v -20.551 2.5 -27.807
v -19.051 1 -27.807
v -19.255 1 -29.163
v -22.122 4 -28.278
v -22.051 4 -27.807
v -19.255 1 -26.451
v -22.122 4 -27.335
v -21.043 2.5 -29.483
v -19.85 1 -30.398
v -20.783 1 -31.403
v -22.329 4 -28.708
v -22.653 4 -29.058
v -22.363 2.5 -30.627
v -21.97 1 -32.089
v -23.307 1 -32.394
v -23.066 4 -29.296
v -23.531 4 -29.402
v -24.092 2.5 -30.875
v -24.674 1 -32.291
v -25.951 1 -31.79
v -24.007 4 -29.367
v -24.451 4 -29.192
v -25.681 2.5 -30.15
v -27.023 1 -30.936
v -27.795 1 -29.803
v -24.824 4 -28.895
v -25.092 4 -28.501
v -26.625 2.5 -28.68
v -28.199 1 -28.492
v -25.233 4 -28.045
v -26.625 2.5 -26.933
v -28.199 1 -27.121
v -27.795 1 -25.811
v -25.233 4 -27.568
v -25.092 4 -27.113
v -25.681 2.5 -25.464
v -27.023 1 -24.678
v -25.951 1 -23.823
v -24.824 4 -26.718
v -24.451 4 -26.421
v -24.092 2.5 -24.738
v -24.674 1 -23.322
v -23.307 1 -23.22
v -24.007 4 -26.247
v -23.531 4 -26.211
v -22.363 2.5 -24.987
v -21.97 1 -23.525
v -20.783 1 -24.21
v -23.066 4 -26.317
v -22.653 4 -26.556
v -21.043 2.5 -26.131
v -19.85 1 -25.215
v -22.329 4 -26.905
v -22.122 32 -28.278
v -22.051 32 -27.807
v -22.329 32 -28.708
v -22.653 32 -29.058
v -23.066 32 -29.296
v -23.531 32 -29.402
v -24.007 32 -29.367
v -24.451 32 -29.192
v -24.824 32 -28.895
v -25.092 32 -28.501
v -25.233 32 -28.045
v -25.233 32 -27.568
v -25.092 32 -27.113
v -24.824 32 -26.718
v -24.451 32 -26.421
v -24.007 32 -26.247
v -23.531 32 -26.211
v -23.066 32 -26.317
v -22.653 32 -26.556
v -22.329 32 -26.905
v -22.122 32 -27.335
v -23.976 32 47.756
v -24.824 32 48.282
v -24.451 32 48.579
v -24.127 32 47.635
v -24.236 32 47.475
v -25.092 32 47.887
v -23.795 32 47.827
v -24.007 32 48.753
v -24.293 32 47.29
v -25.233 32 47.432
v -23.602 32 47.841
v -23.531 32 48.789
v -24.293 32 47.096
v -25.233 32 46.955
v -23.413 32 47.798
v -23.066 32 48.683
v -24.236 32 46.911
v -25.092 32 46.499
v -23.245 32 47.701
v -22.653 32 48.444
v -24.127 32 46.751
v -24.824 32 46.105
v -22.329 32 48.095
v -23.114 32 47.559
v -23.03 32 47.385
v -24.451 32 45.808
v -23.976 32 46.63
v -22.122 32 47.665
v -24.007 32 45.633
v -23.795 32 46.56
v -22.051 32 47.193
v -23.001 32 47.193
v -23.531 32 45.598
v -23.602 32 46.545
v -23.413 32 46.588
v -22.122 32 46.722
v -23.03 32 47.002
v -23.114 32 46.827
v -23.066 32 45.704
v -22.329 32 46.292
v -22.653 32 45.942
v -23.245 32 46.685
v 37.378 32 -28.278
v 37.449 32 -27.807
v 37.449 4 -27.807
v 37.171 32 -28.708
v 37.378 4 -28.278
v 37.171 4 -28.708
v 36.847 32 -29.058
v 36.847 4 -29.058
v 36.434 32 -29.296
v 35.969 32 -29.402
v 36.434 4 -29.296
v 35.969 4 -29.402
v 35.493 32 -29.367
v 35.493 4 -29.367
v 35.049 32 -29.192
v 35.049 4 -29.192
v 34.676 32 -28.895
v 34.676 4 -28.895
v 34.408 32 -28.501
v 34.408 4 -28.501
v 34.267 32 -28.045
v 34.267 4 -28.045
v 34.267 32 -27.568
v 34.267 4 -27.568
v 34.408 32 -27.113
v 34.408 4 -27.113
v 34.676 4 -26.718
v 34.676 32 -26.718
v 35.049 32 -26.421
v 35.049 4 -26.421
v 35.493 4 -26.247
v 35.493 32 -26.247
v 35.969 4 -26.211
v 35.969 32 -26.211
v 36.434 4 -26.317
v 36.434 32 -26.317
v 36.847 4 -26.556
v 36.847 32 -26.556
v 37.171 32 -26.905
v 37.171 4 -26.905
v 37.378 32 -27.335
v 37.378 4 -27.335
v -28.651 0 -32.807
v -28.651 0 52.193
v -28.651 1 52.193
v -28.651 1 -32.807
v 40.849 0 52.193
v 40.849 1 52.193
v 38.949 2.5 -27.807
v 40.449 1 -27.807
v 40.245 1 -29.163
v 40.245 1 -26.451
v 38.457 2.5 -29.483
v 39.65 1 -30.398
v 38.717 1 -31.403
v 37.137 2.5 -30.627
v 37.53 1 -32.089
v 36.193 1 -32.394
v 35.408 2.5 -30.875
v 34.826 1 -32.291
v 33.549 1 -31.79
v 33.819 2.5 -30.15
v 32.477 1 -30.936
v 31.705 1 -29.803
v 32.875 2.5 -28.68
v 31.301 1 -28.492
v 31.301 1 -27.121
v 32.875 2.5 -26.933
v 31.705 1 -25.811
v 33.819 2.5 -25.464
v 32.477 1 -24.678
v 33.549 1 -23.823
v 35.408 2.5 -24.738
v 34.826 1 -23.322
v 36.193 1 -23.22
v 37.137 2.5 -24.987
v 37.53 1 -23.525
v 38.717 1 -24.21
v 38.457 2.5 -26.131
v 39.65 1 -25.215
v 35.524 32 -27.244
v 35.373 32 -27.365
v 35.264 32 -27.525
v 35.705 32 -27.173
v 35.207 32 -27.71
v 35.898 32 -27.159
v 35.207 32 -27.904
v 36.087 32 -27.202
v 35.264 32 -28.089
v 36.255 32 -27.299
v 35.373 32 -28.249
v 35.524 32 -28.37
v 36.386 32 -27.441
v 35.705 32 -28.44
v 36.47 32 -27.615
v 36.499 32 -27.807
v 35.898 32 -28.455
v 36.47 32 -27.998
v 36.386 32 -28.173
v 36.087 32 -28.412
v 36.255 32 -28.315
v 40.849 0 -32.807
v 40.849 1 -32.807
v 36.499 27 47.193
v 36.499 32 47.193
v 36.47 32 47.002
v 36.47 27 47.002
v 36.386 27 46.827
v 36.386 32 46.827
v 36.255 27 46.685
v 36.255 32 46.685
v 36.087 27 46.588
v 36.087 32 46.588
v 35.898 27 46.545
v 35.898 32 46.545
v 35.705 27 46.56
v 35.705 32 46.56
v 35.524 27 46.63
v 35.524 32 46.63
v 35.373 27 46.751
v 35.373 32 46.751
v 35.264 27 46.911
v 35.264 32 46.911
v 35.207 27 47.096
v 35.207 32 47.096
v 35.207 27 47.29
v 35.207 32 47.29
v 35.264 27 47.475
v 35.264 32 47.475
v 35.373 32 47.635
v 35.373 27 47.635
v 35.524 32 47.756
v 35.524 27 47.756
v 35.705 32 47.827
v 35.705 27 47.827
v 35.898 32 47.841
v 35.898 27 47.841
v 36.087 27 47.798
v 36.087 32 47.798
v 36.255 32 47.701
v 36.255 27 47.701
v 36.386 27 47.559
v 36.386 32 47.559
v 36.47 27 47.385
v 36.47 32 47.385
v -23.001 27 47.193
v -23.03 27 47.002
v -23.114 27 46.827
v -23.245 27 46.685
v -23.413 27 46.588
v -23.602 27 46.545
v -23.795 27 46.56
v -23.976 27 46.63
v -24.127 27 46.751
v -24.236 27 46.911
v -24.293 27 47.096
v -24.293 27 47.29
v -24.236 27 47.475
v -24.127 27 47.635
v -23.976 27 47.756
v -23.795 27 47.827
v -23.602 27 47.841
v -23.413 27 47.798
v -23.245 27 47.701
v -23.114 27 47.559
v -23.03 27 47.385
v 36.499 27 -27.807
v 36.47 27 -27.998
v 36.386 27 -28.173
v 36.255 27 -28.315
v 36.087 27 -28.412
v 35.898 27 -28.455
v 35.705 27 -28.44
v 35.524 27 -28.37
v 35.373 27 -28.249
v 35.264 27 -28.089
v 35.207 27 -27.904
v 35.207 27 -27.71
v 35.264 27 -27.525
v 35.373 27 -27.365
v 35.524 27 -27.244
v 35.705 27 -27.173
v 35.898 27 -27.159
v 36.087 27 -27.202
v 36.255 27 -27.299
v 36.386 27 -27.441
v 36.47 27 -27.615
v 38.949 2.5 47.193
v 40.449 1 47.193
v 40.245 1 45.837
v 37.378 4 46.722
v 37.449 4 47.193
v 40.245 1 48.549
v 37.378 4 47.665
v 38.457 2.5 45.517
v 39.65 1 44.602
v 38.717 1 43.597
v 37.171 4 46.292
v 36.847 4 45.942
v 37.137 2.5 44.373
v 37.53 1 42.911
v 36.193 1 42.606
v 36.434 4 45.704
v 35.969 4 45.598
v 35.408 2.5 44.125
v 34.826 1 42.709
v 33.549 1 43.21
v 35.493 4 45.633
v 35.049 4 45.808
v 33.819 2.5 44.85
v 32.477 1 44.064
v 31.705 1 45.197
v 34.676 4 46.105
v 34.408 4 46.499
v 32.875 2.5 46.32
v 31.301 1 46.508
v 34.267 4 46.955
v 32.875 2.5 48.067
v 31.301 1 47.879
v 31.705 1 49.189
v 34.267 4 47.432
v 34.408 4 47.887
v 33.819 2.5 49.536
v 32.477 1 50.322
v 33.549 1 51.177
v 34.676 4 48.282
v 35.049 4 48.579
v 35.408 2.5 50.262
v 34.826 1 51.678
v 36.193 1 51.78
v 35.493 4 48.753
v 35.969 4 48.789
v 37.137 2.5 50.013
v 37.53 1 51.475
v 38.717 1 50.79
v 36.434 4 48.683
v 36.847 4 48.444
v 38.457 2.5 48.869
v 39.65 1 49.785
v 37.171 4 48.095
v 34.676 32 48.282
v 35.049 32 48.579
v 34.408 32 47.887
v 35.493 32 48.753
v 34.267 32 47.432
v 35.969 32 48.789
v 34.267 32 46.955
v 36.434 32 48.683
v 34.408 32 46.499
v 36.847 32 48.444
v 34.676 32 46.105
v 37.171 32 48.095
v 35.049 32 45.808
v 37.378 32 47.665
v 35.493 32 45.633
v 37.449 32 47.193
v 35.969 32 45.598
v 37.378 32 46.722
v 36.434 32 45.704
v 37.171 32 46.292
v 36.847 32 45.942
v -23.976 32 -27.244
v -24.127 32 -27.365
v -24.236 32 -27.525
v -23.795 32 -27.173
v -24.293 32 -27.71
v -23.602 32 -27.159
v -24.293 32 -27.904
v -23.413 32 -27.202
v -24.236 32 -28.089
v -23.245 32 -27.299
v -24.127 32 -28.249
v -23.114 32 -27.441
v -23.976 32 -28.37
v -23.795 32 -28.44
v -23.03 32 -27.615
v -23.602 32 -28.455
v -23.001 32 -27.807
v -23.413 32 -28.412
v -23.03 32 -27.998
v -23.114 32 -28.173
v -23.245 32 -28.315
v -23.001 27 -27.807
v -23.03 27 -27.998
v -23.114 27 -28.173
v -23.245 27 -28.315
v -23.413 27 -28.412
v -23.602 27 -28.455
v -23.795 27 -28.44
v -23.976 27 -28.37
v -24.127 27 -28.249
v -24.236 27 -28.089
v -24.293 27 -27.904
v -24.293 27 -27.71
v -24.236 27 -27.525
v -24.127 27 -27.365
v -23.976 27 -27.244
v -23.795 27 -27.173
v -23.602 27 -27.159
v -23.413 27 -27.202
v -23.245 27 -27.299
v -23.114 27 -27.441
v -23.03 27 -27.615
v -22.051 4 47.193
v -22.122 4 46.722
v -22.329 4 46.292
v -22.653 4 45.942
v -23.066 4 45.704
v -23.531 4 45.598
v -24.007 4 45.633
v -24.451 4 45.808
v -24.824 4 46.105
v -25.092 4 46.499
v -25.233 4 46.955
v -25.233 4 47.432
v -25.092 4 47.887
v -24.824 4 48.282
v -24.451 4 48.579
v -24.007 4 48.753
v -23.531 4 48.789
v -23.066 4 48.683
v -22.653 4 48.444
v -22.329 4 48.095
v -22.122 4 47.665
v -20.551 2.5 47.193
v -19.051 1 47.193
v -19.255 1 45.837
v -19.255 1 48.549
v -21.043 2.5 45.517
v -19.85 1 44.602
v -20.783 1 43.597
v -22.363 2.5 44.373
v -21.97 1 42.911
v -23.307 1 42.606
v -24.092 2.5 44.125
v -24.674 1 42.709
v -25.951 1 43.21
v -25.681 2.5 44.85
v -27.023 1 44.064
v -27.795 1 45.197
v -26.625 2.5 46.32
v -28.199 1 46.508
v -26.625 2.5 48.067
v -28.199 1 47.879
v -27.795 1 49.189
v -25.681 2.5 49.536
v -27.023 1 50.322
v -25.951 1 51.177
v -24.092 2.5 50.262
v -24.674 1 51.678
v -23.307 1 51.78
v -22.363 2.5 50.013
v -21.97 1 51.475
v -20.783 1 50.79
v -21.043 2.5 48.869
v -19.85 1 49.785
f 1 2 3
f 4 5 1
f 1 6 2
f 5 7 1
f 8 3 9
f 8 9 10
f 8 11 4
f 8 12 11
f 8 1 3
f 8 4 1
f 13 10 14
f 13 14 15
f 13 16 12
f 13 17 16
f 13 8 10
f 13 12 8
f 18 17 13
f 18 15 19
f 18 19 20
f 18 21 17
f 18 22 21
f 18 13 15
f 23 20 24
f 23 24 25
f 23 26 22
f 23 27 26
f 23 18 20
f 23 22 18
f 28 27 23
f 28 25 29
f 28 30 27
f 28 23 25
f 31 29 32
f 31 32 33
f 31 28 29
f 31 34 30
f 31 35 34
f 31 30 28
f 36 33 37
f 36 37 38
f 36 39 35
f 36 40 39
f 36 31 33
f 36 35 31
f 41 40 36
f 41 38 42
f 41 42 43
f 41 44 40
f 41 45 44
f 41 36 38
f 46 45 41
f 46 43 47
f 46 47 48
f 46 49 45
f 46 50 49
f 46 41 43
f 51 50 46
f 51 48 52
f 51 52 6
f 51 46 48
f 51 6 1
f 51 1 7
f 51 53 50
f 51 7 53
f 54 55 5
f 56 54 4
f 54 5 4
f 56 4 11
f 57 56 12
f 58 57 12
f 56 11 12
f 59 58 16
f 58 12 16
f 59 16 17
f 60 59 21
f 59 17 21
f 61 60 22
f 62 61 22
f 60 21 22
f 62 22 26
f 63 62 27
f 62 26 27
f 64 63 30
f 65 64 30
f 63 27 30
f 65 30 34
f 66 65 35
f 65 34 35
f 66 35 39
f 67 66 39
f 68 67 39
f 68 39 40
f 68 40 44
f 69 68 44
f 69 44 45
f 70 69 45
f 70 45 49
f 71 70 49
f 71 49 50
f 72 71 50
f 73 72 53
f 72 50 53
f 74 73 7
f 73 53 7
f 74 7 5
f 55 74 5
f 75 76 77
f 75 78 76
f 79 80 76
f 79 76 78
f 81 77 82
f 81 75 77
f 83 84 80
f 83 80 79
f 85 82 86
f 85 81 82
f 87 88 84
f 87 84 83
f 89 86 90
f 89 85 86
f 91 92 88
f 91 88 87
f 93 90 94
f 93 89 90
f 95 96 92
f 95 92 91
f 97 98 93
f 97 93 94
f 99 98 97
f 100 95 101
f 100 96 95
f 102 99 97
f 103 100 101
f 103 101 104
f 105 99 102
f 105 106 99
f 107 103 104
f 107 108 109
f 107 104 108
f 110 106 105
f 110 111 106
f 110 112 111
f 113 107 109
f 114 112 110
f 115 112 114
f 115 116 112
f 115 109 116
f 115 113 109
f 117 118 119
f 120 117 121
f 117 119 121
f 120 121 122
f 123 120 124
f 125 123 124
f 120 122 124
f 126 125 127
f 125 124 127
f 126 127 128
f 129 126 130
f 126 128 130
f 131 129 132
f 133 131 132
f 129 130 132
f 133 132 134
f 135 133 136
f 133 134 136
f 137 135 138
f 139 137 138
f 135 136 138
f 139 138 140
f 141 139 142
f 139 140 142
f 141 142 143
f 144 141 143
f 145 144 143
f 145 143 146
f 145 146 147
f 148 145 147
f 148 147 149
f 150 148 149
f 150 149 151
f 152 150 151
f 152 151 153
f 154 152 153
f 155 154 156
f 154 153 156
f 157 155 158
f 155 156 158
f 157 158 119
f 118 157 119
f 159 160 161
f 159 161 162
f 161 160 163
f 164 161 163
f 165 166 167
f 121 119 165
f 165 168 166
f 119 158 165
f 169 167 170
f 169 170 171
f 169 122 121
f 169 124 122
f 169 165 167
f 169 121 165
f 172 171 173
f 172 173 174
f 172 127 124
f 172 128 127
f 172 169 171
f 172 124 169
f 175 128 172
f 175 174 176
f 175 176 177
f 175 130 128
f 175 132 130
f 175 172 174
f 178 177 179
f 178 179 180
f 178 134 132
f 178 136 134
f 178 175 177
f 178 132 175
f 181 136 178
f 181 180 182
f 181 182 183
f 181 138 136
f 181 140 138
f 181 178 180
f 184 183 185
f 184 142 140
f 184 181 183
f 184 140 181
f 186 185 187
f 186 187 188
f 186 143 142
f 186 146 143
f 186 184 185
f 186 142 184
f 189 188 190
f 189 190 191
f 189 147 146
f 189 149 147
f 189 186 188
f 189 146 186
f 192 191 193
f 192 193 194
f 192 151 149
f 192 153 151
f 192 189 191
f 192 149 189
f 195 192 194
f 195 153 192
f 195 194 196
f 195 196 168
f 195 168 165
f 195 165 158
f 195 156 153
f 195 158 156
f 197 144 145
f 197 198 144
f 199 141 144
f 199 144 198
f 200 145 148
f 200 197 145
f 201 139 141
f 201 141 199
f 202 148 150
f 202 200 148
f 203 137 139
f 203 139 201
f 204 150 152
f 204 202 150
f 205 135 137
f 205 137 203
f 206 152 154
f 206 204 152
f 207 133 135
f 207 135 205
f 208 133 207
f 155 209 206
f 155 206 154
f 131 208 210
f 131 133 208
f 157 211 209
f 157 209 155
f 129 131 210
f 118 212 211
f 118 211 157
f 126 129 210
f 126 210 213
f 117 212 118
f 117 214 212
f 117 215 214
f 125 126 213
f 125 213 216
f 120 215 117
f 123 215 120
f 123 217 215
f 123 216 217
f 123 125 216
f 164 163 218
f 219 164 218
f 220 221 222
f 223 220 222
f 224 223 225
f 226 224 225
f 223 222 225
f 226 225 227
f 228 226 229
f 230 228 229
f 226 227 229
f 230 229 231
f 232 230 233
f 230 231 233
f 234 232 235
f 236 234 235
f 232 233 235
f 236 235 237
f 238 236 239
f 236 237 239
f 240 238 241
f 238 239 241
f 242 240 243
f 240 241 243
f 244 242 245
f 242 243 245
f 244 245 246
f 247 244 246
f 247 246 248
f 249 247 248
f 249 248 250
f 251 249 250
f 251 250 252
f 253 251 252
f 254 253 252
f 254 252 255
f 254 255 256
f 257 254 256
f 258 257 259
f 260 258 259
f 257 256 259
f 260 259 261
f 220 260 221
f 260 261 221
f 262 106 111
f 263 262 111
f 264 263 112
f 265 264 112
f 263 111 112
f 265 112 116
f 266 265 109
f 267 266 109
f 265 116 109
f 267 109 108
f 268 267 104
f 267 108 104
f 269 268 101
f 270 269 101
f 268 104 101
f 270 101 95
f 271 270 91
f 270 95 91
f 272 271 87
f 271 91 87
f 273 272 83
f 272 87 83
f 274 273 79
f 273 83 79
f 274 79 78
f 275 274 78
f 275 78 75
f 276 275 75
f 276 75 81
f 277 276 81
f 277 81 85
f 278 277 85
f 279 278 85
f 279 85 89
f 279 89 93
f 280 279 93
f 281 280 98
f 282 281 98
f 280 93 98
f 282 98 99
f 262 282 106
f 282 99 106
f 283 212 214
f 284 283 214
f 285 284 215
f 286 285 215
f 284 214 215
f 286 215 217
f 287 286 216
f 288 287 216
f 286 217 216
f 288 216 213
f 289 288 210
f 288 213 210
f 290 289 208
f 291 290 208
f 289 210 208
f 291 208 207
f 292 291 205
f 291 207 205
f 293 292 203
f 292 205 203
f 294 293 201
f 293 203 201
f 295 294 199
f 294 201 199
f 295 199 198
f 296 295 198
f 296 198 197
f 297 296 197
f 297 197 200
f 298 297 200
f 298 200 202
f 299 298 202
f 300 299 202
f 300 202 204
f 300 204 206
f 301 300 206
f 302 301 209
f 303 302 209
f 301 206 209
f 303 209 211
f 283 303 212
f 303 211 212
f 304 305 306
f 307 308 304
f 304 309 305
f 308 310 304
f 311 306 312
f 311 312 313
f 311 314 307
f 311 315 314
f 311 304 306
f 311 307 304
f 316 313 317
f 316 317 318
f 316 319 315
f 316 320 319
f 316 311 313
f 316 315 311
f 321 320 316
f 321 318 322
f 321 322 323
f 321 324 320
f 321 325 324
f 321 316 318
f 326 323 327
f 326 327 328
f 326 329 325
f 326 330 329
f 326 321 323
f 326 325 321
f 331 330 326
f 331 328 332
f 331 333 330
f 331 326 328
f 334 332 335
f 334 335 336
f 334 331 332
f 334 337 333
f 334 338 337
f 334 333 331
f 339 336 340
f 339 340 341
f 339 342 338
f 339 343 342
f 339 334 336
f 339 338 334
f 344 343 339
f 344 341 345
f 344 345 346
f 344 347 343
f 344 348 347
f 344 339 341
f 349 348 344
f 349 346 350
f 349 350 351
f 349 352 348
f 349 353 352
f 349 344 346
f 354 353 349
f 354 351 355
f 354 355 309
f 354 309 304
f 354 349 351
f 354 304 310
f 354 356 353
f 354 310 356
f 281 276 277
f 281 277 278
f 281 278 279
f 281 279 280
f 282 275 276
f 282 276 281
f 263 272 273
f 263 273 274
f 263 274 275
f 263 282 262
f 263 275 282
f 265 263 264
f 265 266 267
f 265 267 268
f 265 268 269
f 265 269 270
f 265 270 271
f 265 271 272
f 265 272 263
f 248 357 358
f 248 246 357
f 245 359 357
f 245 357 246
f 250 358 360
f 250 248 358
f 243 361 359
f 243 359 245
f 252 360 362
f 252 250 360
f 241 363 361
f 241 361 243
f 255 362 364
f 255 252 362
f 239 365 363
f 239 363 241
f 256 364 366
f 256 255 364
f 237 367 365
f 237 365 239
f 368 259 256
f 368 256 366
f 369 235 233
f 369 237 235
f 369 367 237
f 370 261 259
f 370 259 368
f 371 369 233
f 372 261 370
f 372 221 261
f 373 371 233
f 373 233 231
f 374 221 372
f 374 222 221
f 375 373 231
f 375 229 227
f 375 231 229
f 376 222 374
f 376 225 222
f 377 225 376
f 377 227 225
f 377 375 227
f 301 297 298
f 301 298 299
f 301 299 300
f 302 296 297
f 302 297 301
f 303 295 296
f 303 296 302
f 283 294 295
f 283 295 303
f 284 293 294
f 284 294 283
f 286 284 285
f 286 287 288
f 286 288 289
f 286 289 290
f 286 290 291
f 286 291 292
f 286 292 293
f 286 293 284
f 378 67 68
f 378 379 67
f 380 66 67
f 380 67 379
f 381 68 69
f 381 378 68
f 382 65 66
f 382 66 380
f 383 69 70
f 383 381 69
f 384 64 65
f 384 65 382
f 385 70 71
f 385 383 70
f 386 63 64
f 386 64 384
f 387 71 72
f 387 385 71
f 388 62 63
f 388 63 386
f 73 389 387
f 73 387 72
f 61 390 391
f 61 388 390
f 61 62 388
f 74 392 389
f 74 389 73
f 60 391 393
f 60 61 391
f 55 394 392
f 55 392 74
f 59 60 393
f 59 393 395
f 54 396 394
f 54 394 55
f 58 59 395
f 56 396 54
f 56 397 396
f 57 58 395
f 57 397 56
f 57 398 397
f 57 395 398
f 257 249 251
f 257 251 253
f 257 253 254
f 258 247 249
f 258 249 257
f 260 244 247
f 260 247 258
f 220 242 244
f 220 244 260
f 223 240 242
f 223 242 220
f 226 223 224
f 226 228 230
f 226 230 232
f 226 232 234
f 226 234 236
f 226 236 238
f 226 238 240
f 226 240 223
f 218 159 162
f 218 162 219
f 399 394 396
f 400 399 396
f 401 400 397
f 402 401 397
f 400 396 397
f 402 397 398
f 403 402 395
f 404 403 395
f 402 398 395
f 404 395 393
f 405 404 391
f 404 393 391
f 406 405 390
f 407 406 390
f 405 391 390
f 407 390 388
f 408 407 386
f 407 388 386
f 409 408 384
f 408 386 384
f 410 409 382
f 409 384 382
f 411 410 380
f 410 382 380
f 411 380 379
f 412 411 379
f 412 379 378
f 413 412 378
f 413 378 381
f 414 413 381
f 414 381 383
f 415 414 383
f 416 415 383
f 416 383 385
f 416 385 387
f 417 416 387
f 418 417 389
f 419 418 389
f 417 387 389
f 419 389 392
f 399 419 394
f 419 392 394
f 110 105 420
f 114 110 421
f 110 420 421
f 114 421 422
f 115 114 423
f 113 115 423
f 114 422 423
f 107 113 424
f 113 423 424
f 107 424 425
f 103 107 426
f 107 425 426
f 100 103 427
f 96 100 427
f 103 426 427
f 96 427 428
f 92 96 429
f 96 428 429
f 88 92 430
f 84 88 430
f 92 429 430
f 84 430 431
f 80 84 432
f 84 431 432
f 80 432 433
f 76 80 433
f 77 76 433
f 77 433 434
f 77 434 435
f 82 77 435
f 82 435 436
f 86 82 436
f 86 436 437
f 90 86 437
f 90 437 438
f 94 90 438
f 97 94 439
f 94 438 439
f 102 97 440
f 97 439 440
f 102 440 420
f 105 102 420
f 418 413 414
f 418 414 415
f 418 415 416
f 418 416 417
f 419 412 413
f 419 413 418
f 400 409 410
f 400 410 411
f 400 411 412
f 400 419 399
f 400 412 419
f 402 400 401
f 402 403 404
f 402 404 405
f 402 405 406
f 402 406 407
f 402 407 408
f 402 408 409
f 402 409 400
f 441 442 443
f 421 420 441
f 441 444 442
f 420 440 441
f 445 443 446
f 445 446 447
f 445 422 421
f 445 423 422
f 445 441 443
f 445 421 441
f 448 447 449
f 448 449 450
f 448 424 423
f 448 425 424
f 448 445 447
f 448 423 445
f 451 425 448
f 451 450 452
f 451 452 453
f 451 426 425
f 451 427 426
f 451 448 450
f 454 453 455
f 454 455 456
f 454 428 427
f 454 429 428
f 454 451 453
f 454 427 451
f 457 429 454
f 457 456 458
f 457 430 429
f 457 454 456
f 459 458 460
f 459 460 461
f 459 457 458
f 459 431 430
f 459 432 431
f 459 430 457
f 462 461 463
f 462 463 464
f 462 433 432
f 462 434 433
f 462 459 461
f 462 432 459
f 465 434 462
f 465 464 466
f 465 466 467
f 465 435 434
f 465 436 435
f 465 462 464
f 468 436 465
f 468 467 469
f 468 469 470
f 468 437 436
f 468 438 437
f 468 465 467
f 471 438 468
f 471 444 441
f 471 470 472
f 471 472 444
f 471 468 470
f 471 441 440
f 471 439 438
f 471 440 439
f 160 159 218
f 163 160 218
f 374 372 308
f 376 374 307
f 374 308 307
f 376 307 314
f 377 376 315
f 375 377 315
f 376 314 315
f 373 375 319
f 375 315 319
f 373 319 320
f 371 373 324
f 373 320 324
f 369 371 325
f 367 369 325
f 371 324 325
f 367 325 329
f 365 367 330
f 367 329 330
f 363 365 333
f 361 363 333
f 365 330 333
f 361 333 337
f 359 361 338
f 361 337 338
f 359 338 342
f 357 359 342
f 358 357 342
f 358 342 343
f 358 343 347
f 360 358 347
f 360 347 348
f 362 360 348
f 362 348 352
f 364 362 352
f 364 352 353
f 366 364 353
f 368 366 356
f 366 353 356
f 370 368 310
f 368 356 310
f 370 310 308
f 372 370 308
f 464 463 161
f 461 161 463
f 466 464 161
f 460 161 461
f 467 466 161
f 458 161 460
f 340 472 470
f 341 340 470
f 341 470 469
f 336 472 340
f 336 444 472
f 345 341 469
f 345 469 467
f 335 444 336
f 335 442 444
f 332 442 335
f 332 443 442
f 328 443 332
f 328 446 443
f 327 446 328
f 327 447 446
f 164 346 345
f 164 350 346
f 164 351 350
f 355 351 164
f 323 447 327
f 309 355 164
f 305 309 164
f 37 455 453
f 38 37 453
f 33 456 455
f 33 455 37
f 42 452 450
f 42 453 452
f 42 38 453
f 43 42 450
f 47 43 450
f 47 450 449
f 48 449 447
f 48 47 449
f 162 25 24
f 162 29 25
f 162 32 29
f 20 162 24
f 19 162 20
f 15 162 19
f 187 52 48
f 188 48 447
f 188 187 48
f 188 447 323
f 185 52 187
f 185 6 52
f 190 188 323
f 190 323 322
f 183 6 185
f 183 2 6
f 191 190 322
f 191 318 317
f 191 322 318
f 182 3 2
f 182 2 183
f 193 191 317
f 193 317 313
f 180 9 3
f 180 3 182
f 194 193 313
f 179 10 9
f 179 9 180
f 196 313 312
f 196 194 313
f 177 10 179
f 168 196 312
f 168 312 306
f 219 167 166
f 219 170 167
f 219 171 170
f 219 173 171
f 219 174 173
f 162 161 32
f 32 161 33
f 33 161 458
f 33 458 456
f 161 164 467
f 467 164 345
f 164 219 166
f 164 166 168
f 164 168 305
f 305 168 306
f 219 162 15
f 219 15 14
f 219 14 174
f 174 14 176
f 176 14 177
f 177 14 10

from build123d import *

# Parameters (mm, degrees)
SKETCH_1_W          = 69.5
SKETCH_1_H          = 85
EXTRUDE_1_DEPTH     = 1
SKETCH_2_R          = 1.6
EXTRUDE_2_DEPTH     = 31
SKETCH_3_R          = 0.65
CUT_EXTRUDE_1_DEPTH = 5
CHAMFER_1_SIZE      = 3


with BuildPart() as part:
    # Эскиз1 → Бобышка-Вытянуть1 (new body)
    with BuildSketch(Plane(origin=(0, 0, 0), x_dir=(1, 0, 0), z_dir=(0, 1, 0))):
        with Locations((6.099344978, -9.693231441)):
            Rectangle(SKETCH_1_W, SKETCH_1_H)
    extrude(amount=EXTRUDE_1_DEPTH)

    # Эскиз2 → Бобышка-Вытянуть2 (add)
    with BuildSketch(Plane(origin=(0, 1, 0), x_dir=(1, 0, 0), z_dir=(0, 1, 0))):
        with Locations((-23.650655022, 27.806768559)):
            Circle(SKETCH_2_R)
        with Locations((35.849344978, 27.806768559)):
            Circle(SKETCH_2_R)
        with Locations((35.849344978, -47.193231441)):
            Circle(SKETCH_2_R)
        with Locations((-23.650655022, -47.193231441)):
            Circle(SKETCH_2_R)
    extrude(amount=EXTRUDE_2_DEPTH)

    # Эскиз3 → Вырез-Вытянуть1 (cut)
    with BuildSketch(Plane(origin=(0, 32, 0), x_dir=(1, 0, 0), z_dir=(0, 1, 0))):
        with Locations((-23.650655022, -47.193231441)):
            Circle(SKETCH_3_R)
        with Locations((35.849344978, -47.193231441)):
            Circle(SKETCH_3_R)
        with Locations((35.849344978, 27.806768559)):
            Circle(SKETCH_3_R)
        with Locations((-23.650655022, 27.806768559)):
            Circle(SKETCH_3_R)
    extrude(amount=-CUT_EXTRUDE_1_DEPTH, mode=Mode.SUBTRACT)

    # Фаска1
    chamfer_1_edges = [part.edges().sort_by_distance(p)[0] for p in [
        (-25.250655022, 1, -27.806768559),
        (34.249344978, 1, -27.806768559),
        (34.249344978, 1, 47.193231441),
        (-25.250655022, 1, 47.193231441),
    ]]
    chamfer(chamfer_1_edges, length=CHAMFER_1_SIZE)


solid = part.part
